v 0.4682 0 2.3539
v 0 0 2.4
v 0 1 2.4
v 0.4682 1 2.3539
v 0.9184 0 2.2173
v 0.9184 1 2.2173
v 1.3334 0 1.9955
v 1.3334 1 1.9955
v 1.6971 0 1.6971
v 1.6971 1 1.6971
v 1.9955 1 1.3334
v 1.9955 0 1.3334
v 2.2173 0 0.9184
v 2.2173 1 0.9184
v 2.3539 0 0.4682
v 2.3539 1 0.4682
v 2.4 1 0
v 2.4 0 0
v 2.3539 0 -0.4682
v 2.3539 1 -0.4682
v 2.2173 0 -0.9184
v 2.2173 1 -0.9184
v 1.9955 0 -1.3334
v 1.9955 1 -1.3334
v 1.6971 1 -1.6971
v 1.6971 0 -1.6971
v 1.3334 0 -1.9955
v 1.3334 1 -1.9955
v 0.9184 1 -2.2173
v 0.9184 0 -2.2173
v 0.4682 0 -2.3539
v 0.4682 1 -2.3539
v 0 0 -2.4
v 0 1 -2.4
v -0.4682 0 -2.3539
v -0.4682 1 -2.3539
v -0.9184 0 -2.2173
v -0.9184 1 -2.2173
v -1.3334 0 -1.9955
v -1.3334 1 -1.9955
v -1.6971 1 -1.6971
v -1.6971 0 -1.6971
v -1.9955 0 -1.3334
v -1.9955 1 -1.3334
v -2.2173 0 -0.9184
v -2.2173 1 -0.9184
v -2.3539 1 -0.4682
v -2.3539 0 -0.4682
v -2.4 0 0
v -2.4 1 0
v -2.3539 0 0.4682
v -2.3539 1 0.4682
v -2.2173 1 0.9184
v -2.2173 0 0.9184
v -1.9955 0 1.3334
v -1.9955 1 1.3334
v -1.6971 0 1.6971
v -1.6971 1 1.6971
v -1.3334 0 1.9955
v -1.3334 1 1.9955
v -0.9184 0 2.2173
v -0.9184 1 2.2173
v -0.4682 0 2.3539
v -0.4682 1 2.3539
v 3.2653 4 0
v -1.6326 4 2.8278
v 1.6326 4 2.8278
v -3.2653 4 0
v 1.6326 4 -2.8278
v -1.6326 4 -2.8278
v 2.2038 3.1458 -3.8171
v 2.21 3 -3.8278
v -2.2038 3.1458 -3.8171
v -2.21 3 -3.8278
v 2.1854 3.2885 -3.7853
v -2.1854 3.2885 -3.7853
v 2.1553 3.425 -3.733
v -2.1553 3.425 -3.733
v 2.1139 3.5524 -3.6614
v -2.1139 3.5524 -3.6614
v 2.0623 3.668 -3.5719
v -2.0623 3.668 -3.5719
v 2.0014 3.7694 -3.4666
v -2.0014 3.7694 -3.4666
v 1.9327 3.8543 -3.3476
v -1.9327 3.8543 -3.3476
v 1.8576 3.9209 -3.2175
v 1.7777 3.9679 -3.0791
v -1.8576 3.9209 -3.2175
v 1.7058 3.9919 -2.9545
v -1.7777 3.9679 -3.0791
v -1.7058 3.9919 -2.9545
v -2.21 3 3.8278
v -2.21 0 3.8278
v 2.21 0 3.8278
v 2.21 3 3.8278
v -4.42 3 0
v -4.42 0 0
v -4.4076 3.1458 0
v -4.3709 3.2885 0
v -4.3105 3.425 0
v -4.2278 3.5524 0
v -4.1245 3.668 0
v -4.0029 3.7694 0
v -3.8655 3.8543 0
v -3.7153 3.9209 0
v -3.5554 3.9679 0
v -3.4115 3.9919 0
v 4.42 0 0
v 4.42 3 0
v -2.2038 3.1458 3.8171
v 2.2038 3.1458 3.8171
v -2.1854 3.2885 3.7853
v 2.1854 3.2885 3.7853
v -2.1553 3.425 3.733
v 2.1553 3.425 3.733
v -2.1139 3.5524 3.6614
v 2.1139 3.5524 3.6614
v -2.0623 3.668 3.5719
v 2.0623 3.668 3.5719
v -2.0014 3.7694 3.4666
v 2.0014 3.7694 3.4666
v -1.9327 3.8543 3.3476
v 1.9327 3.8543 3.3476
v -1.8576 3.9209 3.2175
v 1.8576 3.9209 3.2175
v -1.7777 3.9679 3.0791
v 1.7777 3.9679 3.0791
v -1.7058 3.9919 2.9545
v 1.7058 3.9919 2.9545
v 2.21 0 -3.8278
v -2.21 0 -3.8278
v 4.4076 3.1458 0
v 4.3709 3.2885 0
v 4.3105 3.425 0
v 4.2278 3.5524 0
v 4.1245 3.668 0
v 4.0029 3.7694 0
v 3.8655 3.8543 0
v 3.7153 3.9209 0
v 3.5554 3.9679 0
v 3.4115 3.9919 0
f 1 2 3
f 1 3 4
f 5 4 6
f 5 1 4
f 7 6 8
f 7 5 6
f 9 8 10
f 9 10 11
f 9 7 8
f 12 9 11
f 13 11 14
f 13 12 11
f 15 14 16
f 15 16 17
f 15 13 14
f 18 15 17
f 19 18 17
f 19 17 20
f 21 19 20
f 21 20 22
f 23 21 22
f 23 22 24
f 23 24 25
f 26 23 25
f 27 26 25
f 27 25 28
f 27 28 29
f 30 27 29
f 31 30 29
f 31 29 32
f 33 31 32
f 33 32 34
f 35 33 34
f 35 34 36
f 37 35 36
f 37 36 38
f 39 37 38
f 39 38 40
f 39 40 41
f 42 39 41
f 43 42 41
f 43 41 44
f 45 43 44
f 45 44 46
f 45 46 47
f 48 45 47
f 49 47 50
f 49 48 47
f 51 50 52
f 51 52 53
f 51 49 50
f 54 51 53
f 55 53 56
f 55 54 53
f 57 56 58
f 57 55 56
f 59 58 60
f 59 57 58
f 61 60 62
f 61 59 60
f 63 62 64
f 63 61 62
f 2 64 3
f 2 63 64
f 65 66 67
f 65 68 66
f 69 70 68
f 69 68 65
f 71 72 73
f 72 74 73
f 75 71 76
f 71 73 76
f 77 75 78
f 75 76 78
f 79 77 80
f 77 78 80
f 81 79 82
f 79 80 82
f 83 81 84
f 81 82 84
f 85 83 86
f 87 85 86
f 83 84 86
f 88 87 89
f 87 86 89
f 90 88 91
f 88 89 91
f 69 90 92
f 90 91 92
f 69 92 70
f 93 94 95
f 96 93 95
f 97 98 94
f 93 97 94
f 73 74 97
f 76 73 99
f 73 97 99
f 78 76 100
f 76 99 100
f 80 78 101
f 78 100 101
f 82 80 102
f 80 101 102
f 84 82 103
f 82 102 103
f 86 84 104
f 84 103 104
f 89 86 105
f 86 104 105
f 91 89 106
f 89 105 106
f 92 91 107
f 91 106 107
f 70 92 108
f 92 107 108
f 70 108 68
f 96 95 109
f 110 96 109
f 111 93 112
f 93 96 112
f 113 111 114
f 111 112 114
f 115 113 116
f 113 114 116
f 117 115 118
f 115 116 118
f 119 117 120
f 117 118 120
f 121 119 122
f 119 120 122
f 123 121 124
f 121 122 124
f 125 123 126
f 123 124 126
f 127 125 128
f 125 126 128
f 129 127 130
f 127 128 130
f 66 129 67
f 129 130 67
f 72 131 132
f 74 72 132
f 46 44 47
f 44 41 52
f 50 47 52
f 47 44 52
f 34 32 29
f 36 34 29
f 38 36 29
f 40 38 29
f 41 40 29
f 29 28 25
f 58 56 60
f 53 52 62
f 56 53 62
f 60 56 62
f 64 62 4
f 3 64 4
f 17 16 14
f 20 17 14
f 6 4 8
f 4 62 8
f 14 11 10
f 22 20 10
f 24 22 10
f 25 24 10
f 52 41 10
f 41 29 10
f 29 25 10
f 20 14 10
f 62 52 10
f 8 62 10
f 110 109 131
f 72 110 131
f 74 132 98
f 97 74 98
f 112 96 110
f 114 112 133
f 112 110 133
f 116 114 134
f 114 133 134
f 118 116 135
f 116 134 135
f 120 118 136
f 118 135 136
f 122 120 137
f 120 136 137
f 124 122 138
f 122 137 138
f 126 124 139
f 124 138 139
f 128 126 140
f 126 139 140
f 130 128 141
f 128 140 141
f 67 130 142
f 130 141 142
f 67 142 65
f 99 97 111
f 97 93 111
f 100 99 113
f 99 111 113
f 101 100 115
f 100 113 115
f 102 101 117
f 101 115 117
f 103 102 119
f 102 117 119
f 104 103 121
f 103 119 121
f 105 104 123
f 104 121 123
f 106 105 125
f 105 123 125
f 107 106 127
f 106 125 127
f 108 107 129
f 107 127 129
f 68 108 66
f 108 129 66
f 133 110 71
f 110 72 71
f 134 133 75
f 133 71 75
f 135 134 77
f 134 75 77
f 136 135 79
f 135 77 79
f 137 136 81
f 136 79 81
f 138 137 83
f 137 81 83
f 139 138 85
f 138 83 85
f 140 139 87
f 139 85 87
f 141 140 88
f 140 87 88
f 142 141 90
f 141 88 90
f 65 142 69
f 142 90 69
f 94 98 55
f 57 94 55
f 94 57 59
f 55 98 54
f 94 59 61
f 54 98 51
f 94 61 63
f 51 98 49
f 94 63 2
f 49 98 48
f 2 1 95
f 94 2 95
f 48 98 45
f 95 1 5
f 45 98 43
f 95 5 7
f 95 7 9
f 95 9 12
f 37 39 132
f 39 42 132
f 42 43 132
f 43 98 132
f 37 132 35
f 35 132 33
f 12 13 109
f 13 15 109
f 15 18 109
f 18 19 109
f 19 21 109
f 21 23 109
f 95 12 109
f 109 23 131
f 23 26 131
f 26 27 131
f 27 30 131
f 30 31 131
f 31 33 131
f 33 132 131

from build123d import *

# Parameters (mm, degrees)
SKETCH1_R           = 2.4
BOSS_EXTRUDE1_DEPTH = 4
FILLET1_R           = 1
BOSS_EXTRUDE4_START = -3
SKETCH2_R           = 2.4
BOSS_EXTRUDE4_DEPTH = 3


with BuildPart() as part:
    # Sketch1 → Boss-Extrude1 (new body)
    with BuildSketch(Plane(origin=(0, 0, 0), x_dir=(1, 0, 0), z_dir=(0, 1, 0))):
        Polygon((-4.419962439, 0), (-2.20998122, -3.827799756), (2.20998122, -3.827799756), (4.419962439, 0), (2.20998122, 3.827799756), (-2.20998122, 3.827799756), align=None)
        with Locations(Location((0, 0, 0), (0, 0, 270))):
            Circle(SKETCH1_R, mode=Mode.SUBTRACT)
    extrude(amount=BOSS_EXTRUDE1_DEPTH)

    # Fillet1
    fillet1_edges = [part.edges().sort_by_distance(p)[0] for p in [
        (0, 4, 3.827799756),
        (3.31497183, 4, 1.913899878),
        (3.31497183, 4, -1.913899878),
        (0, 4, -3.827799756),
        (-3.31497183, 4, -1.913899878),
        (-3.31497183, 4, 1.913899878),
    ]]
    fillet(fillet1_edges, radius=FILLET1_R)

    # Sketch2 → Boss-Extrude4 (add)
    with BuildSketch(Plane(origin=(0, 4, 0), x_dir=(1, 0, 0), z_dir=(0, 1, 0)).offset(BOSS_EXTRUDE4_START)):
        with Locations(Location((0, 0, 0), (0, 0, 270))):
            Circle(SKETCH2_R)
    extrude(amount=BOSS_EXTRUDE4_DEPTH)


solid = part.part
